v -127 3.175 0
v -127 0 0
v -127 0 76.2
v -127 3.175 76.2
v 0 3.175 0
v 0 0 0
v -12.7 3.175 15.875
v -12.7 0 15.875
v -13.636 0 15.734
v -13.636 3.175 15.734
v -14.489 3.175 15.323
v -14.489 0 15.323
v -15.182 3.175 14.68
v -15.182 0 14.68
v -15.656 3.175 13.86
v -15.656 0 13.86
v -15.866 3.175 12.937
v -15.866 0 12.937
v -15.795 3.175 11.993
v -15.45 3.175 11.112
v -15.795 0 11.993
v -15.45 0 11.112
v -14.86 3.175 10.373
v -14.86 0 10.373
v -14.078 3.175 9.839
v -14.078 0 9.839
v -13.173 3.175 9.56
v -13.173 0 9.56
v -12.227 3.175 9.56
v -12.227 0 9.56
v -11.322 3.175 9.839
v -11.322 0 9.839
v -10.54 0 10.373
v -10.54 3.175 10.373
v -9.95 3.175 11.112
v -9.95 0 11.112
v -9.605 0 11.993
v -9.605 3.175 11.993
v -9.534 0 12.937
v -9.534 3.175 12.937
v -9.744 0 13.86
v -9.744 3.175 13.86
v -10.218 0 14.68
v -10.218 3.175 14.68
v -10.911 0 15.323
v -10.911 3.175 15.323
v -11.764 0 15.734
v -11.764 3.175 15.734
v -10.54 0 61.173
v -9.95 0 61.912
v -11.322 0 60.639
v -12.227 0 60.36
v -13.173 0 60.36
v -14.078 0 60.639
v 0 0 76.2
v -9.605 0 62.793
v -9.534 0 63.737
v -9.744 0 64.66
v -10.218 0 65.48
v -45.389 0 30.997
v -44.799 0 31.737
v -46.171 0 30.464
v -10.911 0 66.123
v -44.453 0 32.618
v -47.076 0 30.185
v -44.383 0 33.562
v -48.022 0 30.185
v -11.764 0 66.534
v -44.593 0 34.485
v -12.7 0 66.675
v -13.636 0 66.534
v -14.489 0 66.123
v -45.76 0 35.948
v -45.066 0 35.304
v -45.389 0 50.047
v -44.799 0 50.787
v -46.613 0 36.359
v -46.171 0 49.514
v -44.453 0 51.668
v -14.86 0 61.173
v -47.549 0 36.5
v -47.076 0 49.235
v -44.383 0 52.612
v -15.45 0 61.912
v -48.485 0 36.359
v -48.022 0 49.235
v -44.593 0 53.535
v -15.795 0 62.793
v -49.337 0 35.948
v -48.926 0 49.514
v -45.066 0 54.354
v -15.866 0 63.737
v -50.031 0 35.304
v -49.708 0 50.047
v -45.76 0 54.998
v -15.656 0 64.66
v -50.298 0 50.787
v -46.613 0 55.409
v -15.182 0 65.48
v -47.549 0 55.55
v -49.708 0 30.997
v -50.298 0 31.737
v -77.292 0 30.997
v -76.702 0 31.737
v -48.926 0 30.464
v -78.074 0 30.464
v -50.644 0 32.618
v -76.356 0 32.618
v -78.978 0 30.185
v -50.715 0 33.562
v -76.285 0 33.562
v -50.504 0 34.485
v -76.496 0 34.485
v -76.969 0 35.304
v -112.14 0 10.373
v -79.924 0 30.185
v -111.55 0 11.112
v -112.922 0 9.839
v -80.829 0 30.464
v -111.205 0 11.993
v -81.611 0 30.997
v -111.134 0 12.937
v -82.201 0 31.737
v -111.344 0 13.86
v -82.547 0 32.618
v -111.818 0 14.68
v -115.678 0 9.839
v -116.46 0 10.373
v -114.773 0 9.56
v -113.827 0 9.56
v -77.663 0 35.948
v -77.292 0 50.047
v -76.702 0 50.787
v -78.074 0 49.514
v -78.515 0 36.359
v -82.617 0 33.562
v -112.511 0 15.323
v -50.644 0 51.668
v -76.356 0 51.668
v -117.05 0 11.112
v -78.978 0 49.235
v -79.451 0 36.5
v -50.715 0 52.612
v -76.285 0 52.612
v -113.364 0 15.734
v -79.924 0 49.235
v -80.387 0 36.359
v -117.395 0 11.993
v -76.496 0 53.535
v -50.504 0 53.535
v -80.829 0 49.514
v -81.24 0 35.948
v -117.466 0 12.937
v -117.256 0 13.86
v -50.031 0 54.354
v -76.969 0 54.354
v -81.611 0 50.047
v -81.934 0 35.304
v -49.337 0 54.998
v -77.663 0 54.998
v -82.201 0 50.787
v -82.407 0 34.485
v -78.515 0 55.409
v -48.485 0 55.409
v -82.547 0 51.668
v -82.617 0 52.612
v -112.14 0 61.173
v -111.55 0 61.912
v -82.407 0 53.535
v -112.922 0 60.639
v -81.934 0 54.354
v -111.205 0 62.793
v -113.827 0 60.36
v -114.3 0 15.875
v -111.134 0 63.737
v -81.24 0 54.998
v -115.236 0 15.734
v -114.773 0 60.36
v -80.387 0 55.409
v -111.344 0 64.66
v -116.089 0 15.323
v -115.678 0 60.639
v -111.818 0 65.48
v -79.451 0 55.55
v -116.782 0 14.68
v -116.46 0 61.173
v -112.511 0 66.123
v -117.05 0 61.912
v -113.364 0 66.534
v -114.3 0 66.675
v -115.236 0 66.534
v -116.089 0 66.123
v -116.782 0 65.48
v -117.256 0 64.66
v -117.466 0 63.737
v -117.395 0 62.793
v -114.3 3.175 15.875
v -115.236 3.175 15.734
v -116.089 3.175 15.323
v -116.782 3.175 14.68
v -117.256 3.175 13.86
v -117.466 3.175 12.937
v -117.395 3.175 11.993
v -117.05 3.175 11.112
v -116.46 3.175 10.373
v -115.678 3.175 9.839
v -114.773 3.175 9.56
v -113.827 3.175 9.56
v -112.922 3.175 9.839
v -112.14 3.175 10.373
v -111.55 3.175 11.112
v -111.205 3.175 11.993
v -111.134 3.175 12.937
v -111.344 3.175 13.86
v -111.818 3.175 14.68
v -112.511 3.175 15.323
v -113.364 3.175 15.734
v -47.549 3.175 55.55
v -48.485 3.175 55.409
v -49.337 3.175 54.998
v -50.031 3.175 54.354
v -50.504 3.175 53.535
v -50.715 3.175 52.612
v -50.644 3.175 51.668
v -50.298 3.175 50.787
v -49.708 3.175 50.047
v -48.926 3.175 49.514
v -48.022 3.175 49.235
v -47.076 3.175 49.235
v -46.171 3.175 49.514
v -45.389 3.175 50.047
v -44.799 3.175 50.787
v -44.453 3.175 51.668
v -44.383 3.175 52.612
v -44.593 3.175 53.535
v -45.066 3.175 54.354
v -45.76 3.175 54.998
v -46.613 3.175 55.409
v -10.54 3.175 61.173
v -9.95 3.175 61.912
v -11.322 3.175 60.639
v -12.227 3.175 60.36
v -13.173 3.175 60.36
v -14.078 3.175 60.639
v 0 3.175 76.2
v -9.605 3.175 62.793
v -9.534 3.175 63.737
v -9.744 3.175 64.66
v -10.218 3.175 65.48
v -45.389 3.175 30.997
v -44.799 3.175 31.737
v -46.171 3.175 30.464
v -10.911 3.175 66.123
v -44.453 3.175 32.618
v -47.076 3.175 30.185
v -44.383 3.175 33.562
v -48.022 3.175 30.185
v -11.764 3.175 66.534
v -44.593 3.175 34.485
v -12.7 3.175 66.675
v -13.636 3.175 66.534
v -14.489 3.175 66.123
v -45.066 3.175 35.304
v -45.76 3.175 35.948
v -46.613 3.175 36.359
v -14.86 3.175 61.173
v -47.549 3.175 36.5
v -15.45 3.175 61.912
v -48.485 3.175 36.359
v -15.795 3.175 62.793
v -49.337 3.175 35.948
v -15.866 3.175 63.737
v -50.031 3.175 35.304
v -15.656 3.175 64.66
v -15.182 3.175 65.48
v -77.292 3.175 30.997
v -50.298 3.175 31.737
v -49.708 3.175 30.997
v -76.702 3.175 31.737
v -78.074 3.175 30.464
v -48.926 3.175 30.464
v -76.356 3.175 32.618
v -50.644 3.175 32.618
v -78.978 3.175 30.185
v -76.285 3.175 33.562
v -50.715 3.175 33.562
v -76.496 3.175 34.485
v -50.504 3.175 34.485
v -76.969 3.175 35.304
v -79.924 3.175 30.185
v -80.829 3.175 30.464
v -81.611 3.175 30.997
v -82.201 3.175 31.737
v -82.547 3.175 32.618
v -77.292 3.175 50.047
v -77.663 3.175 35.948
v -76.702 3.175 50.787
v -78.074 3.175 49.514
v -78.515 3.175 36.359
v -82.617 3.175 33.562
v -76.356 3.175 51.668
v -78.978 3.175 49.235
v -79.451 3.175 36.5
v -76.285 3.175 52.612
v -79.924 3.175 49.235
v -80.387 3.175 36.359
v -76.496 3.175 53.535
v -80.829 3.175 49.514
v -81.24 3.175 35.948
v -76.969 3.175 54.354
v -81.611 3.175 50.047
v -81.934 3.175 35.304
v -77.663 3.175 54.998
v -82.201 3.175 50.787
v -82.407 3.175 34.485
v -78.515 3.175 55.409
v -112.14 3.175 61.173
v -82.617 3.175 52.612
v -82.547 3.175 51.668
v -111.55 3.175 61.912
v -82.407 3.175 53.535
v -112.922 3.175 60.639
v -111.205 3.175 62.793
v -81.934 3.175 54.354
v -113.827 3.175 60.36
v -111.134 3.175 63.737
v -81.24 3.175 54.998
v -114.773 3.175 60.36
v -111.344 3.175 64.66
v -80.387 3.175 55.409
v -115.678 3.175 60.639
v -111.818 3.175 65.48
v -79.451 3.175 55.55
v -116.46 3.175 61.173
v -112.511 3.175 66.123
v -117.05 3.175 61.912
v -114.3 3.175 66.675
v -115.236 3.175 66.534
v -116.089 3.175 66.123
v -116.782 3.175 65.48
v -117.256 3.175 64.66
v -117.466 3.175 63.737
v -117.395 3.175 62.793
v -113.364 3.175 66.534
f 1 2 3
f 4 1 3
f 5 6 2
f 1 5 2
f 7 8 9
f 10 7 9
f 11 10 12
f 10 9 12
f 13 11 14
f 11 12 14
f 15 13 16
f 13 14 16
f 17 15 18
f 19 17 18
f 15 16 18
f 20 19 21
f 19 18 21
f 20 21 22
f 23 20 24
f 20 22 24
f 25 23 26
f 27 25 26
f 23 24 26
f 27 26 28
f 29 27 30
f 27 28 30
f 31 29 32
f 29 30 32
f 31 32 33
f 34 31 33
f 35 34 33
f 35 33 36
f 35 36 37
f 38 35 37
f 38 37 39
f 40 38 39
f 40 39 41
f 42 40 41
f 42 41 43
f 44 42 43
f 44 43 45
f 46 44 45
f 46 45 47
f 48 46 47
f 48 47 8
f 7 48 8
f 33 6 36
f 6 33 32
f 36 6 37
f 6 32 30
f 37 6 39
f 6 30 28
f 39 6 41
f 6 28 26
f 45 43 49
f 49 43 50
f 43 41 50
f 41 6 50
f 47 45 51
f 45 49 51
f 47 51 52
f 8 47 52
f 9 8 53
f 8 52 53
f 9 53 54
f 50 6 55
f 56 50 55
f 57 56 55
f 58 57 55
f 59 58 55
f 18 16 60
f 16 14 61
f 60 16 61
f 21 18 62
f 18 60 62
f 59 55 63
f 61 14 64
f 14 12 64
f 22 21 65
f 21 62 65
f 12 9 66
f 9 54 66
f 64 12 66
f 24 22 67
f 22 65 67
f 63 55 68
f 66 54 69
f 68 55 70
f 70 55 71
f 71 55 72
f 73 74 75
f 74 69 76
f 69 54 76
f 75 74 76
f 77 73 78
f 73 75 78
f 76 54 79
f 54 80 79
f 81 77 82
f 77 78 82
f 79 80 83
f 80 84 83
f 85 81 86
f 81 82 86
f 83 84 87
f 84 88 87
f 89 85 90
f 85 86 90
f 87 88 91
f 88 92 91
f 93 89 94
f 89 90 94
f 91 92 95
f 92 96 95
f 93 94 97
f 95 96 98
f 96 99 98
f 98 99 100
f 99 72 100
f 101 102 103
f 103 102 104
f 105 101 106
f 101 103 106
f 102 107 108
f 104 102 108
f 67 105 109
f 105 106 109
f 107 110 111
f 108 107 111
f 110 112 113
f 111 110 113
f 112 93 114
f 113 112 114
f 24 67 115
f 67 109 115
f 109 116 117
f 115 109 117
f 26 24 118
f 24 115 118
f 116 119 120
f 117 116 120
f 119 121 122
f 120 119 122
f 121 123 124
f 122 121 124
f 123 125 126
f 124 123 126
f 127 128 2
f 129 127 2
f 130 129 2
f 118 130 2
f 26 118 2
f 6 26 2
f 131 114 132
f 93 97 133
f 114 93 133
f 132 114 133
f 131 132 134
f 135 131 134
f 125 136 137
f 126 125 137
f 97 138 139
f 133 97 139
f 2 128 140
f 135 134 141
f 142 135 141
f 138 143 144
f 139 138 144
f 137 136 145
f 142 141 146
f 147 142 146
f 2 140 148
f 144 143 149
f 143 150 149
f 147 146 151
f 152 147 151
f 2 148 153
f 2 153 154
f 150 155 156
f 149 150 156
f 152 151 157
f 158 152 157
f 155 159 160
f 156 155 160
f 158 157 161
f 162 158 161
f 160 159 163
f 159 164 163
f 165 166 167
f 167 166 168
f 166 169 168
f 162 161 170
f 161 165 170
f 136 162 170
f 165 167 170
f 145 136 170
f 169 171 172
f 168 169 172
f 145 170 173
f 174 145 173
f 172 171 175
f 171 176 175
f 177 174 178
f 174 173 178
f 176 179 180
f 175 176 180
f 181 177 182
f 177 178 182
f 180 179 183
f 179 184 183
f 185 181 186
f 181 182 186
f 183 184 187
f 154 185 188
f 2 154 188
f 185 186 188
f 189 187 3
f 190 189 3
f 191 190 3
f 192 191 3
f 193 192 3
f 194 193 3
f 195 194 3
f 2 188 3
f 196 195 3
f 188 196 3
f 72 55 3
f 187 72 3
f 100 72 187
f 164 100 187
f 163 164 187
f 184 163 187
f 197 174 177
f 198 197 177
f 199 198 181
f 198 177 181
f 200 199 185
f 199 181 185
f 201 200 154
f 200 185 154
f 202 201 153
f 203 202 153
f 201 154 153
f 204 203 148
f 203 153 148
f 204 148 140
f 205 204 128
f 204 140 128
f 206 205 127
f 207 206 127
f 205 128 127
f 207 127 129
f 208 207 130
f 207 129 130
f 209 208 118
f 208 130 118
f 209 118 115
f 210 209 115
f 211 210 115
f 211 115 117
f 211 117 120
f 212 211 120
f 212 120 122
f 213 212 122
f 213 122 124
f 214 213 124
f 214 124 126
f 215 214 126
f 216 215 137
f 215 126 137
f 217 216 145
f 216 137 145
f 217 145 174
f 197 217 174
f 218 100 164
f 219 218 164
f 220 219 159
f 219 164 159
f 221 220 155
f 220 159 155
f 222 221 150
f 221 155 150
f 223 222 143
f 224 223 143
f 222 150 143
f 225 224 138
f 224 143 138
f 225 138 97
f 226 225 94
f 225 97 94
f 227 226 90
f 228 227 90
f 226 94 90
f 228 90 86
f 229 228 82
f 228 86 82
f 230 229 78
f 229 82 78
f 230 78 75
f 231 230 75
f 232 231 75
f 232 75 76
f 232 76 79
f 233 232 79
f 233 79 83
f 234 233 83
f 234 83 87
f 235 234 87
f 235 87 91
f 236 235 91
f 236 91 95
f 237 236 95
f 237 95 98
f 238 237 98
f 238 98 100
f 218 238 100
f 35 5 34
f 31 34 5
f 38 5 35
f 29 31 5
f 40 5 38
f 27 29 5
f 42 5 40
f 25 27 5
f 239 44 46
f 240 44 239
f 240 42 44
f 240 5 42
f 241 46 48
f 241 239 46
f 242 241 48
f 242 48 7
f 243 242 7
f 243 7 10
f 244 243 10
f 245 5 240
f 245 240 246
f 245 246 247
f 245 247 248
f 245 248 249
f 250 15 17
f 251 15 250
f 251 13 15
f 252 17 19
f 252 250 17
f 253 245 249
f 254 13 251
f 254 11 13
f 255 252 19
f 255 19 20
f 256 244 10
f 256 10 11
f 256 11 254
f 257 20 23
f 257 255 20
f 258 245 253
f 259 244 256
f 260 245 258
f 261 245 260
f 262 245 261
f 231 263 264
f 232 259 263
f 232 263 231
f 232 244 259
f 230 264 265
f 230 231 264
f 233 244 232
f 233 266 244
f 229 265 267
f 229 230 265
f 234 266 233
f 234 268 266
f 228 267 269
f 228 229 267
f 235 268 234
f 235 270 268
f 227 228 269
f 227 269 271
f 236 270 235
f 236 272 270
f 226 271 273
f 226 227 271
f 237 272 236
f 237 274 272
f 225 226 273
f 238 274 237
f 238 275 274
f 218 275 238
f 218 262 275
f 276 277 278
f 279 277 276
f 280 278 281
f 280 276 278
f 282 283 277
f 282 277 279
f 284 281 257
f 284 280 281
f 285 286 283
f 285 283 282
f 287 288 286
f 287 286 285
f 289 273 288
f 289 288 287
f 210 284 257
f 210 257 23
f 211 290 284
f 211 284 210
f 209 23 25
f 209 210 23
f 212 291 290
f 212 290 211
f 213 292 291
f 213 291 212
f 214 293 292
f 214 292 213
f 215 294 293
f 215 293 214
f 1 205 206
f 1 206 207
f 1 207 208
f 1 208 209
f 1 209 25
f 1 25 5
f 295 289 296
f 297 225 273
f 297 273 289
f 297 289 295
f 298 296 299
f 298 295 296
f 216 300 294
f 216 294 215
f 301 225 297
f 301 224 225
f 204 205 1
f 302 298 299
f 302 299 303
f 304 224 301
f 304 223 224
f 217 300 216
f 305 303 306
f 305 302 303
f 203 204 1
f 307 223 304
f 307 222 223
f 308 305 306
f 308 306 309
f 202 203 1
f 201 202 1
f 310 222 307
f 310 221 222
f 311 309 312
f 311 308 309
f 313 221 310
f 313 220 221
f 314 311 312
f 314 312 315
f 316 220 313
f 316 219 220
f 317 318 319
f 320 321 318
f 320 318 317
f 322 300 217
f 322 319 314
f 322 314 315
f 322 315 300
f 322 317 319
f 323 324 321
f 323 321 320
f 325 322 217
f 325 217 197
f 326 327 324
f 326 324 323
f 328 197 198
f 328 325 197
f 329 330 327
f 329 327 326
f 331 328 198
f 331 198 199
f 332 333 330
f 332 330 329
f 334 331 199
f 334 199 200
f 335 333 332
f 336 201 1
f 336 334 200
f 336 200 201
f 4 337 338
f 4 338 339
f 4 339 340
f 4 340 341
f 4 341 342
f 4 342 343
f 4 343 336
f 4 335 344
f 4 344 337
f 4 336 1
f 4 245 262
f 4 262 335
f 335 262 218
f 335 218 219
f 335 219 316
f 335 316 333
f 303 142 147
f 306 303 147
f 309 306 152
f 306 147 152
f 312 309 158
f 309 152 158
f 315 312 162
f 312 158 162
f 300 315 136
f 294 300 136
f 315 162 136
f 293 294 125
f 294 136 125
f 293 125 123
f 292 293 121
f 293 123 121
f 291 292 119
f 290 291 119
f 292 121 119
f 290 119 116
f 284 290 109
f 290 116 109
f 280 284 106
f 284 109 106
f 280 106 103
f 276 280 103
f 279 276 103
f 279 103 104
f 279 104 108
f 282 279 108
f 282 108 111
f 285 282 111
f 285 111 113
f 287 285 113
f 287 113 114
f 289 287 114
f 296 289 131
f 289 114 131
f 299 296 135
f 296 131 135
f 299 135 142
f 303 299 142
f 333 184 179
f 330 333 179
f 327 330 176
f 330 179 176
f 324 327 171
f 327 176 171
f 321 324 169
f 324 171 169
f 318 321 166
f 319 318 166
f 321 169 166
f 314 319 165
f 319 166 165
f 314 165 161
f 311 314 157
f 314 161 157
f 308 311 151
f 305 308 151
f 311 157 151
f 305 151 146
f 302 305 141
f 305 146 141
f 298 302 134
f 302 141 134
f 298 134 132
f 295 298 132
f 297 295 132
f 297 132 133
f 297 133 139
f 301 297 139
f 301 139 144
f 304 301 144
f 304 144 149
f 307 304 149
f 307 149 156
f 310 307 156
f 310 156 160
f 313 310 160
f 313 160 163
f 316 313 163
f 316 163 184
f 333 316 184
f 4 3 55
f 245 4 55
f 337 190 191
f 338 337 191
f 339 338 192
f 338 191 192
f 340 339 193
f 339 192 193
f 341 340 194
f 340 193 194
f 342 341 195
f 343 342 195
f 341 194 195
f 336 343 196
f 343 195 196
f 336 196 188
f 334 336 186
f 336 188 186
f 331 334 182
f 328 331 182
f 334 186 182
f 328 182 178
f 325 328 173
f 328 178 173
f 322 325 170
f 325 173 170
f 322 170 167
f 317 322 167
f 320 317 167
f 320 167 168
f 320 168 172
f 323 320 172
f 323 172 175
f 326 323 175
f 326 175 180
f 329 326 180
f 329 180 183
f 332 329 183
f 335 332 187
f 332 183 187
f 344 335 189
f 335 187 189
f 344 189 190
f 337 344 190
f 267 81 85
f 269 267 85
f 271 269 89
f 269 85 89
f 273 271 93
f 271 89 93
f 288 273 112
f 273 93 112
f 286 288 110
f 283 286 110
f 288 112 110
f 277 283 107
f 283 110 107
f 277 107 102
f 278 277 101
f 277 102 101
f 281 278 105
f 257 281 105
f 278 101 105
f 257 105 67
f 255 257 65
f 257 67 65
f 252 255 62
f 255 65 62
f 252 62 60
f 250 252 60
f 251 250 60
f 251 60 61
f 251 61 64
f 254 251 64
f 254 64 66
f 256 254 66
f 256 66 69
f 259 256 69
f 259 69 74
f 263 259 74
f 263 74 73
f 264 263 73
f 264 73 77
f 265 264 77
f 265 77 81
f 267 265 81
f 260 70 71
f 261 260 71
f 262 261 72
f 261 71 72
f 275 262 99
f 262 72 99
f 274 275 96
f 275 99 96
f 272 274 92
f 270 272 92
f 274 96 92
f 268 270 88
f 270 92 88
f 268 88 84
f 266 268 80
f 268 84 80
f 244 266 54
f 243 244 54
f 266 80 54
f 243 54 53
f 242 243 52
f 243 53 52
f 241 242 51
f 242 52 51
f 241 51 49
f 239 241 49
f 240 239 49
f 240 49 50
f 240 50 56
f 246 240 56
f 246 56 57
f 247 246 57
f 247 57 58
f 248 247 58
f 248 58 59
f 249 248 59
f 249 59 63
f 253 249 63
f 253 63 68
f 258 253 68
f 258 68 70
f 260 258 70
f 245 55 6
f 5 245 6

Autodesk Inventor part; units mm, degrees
ref_plane "YZ Plane" through (0, 0, 0) normal (1, 0, 0) x (0, 1, 0)
ref_plane "XZ Plane" through (0, 0, 0) normal (0, 1, 0) x (-1, 0, 0)
ref_plane "XY Plane" through (0, 0, 0) normal (0, 0, 1) x (1, 0, 0)
sketch "Sketch1" plane through (0, 0, 0) normal (0, 1, 0) x (-1, 0, 0)
  line L0 (0, 0) -> (127, 0)
  line L1 (127, 0) -> (127, 76.2)
  line L2 (127, 76.2) -> (0, 76.2)
  line L3 (0, 76.2) -> (0, 0)
  dimension "d0" = 76.2
  dimension "d2" = 127
extrude "Extrusion1" add sketch "Sketch1" along normal blind 3.175
sketch "Sketch2" plane through (0, 3.175, 0) normal (0, 1, 0) x (1, 0, 0)
  line L0 (0, 0) -> (-127, 0) projected
  line L1 (-127, 0) -> (-127, -76.2) projected
  line L2 (-127, -76.2) -> (0, -76.2) projected
  line L3 (0, -76.2) -> (0, 0) projected
  point P0 (-114.3, -12.7)
  point P1 (-114.3, -63.5)
  point P2 (-12.7, -63.5)
  point P3 (-12.7, -12.7)
  dimension "d5" = 12.7
  dimension "d6" = 12.7
  dimension "d7" = 12.7
  dimension "d8" = 12.7
  dimension "d9" = 12.7
  dimension "d10" = 12.7
  dimension "d11" = 12.7
  dimension "d12" = 12.7
  dimension "d13" = 50.8
  dimension "d14" = 101.6
  dimension "d15" = 50.8
hole "Hole1" at (-114.3, 3.175, 12.7) at (-114.3, 3.175, 63.5) at (-12.7, 3.175, 63.5) at (-12.7, 3.175, 12.7) direction (0, -1, 0) diameter 6.35 end through all
sketch "Sketch3" plane through (0, 3.175, 0) normal (0, 1, 0) x (1, 0, 0)
  line L0 (-127, 0) -> (-127, -76.2) projected
  line L1 (-127, -76.2) -> (0, -76.2) projected
  line L2 (0, -76.2) -> (0, 0) projected
  point P0 (-79.4512, -52.3748)
  point P1 (-47.5488, -52.3748)
  point P2 (-79.4512, -33.3248)
  point P3 (-47.5488, -33.3248)
  dimension "d23" = 47.5488
  dimension "d24" = 47.5488
  dimension "d25" = 47.5488
  dimension "d26" = 47.5488
  dimension "d27" = 19.05
  dimension "d28" = 19.05
  dimension "d29" = 23.8252
  dimension "d30" = 23.8252
hole "Hole2" at (-79.4512, 3.175, 52.3748) at (-47.5488, 3.175, 52.3748) at (-79.4512, 3.175, 33.3248) at (-47.5488, 3.175, 33.3248) direction (0, -1, 0) diameter 6.35 end through all
properties part number "CylinderPlate" material "Aluminum 6061"
